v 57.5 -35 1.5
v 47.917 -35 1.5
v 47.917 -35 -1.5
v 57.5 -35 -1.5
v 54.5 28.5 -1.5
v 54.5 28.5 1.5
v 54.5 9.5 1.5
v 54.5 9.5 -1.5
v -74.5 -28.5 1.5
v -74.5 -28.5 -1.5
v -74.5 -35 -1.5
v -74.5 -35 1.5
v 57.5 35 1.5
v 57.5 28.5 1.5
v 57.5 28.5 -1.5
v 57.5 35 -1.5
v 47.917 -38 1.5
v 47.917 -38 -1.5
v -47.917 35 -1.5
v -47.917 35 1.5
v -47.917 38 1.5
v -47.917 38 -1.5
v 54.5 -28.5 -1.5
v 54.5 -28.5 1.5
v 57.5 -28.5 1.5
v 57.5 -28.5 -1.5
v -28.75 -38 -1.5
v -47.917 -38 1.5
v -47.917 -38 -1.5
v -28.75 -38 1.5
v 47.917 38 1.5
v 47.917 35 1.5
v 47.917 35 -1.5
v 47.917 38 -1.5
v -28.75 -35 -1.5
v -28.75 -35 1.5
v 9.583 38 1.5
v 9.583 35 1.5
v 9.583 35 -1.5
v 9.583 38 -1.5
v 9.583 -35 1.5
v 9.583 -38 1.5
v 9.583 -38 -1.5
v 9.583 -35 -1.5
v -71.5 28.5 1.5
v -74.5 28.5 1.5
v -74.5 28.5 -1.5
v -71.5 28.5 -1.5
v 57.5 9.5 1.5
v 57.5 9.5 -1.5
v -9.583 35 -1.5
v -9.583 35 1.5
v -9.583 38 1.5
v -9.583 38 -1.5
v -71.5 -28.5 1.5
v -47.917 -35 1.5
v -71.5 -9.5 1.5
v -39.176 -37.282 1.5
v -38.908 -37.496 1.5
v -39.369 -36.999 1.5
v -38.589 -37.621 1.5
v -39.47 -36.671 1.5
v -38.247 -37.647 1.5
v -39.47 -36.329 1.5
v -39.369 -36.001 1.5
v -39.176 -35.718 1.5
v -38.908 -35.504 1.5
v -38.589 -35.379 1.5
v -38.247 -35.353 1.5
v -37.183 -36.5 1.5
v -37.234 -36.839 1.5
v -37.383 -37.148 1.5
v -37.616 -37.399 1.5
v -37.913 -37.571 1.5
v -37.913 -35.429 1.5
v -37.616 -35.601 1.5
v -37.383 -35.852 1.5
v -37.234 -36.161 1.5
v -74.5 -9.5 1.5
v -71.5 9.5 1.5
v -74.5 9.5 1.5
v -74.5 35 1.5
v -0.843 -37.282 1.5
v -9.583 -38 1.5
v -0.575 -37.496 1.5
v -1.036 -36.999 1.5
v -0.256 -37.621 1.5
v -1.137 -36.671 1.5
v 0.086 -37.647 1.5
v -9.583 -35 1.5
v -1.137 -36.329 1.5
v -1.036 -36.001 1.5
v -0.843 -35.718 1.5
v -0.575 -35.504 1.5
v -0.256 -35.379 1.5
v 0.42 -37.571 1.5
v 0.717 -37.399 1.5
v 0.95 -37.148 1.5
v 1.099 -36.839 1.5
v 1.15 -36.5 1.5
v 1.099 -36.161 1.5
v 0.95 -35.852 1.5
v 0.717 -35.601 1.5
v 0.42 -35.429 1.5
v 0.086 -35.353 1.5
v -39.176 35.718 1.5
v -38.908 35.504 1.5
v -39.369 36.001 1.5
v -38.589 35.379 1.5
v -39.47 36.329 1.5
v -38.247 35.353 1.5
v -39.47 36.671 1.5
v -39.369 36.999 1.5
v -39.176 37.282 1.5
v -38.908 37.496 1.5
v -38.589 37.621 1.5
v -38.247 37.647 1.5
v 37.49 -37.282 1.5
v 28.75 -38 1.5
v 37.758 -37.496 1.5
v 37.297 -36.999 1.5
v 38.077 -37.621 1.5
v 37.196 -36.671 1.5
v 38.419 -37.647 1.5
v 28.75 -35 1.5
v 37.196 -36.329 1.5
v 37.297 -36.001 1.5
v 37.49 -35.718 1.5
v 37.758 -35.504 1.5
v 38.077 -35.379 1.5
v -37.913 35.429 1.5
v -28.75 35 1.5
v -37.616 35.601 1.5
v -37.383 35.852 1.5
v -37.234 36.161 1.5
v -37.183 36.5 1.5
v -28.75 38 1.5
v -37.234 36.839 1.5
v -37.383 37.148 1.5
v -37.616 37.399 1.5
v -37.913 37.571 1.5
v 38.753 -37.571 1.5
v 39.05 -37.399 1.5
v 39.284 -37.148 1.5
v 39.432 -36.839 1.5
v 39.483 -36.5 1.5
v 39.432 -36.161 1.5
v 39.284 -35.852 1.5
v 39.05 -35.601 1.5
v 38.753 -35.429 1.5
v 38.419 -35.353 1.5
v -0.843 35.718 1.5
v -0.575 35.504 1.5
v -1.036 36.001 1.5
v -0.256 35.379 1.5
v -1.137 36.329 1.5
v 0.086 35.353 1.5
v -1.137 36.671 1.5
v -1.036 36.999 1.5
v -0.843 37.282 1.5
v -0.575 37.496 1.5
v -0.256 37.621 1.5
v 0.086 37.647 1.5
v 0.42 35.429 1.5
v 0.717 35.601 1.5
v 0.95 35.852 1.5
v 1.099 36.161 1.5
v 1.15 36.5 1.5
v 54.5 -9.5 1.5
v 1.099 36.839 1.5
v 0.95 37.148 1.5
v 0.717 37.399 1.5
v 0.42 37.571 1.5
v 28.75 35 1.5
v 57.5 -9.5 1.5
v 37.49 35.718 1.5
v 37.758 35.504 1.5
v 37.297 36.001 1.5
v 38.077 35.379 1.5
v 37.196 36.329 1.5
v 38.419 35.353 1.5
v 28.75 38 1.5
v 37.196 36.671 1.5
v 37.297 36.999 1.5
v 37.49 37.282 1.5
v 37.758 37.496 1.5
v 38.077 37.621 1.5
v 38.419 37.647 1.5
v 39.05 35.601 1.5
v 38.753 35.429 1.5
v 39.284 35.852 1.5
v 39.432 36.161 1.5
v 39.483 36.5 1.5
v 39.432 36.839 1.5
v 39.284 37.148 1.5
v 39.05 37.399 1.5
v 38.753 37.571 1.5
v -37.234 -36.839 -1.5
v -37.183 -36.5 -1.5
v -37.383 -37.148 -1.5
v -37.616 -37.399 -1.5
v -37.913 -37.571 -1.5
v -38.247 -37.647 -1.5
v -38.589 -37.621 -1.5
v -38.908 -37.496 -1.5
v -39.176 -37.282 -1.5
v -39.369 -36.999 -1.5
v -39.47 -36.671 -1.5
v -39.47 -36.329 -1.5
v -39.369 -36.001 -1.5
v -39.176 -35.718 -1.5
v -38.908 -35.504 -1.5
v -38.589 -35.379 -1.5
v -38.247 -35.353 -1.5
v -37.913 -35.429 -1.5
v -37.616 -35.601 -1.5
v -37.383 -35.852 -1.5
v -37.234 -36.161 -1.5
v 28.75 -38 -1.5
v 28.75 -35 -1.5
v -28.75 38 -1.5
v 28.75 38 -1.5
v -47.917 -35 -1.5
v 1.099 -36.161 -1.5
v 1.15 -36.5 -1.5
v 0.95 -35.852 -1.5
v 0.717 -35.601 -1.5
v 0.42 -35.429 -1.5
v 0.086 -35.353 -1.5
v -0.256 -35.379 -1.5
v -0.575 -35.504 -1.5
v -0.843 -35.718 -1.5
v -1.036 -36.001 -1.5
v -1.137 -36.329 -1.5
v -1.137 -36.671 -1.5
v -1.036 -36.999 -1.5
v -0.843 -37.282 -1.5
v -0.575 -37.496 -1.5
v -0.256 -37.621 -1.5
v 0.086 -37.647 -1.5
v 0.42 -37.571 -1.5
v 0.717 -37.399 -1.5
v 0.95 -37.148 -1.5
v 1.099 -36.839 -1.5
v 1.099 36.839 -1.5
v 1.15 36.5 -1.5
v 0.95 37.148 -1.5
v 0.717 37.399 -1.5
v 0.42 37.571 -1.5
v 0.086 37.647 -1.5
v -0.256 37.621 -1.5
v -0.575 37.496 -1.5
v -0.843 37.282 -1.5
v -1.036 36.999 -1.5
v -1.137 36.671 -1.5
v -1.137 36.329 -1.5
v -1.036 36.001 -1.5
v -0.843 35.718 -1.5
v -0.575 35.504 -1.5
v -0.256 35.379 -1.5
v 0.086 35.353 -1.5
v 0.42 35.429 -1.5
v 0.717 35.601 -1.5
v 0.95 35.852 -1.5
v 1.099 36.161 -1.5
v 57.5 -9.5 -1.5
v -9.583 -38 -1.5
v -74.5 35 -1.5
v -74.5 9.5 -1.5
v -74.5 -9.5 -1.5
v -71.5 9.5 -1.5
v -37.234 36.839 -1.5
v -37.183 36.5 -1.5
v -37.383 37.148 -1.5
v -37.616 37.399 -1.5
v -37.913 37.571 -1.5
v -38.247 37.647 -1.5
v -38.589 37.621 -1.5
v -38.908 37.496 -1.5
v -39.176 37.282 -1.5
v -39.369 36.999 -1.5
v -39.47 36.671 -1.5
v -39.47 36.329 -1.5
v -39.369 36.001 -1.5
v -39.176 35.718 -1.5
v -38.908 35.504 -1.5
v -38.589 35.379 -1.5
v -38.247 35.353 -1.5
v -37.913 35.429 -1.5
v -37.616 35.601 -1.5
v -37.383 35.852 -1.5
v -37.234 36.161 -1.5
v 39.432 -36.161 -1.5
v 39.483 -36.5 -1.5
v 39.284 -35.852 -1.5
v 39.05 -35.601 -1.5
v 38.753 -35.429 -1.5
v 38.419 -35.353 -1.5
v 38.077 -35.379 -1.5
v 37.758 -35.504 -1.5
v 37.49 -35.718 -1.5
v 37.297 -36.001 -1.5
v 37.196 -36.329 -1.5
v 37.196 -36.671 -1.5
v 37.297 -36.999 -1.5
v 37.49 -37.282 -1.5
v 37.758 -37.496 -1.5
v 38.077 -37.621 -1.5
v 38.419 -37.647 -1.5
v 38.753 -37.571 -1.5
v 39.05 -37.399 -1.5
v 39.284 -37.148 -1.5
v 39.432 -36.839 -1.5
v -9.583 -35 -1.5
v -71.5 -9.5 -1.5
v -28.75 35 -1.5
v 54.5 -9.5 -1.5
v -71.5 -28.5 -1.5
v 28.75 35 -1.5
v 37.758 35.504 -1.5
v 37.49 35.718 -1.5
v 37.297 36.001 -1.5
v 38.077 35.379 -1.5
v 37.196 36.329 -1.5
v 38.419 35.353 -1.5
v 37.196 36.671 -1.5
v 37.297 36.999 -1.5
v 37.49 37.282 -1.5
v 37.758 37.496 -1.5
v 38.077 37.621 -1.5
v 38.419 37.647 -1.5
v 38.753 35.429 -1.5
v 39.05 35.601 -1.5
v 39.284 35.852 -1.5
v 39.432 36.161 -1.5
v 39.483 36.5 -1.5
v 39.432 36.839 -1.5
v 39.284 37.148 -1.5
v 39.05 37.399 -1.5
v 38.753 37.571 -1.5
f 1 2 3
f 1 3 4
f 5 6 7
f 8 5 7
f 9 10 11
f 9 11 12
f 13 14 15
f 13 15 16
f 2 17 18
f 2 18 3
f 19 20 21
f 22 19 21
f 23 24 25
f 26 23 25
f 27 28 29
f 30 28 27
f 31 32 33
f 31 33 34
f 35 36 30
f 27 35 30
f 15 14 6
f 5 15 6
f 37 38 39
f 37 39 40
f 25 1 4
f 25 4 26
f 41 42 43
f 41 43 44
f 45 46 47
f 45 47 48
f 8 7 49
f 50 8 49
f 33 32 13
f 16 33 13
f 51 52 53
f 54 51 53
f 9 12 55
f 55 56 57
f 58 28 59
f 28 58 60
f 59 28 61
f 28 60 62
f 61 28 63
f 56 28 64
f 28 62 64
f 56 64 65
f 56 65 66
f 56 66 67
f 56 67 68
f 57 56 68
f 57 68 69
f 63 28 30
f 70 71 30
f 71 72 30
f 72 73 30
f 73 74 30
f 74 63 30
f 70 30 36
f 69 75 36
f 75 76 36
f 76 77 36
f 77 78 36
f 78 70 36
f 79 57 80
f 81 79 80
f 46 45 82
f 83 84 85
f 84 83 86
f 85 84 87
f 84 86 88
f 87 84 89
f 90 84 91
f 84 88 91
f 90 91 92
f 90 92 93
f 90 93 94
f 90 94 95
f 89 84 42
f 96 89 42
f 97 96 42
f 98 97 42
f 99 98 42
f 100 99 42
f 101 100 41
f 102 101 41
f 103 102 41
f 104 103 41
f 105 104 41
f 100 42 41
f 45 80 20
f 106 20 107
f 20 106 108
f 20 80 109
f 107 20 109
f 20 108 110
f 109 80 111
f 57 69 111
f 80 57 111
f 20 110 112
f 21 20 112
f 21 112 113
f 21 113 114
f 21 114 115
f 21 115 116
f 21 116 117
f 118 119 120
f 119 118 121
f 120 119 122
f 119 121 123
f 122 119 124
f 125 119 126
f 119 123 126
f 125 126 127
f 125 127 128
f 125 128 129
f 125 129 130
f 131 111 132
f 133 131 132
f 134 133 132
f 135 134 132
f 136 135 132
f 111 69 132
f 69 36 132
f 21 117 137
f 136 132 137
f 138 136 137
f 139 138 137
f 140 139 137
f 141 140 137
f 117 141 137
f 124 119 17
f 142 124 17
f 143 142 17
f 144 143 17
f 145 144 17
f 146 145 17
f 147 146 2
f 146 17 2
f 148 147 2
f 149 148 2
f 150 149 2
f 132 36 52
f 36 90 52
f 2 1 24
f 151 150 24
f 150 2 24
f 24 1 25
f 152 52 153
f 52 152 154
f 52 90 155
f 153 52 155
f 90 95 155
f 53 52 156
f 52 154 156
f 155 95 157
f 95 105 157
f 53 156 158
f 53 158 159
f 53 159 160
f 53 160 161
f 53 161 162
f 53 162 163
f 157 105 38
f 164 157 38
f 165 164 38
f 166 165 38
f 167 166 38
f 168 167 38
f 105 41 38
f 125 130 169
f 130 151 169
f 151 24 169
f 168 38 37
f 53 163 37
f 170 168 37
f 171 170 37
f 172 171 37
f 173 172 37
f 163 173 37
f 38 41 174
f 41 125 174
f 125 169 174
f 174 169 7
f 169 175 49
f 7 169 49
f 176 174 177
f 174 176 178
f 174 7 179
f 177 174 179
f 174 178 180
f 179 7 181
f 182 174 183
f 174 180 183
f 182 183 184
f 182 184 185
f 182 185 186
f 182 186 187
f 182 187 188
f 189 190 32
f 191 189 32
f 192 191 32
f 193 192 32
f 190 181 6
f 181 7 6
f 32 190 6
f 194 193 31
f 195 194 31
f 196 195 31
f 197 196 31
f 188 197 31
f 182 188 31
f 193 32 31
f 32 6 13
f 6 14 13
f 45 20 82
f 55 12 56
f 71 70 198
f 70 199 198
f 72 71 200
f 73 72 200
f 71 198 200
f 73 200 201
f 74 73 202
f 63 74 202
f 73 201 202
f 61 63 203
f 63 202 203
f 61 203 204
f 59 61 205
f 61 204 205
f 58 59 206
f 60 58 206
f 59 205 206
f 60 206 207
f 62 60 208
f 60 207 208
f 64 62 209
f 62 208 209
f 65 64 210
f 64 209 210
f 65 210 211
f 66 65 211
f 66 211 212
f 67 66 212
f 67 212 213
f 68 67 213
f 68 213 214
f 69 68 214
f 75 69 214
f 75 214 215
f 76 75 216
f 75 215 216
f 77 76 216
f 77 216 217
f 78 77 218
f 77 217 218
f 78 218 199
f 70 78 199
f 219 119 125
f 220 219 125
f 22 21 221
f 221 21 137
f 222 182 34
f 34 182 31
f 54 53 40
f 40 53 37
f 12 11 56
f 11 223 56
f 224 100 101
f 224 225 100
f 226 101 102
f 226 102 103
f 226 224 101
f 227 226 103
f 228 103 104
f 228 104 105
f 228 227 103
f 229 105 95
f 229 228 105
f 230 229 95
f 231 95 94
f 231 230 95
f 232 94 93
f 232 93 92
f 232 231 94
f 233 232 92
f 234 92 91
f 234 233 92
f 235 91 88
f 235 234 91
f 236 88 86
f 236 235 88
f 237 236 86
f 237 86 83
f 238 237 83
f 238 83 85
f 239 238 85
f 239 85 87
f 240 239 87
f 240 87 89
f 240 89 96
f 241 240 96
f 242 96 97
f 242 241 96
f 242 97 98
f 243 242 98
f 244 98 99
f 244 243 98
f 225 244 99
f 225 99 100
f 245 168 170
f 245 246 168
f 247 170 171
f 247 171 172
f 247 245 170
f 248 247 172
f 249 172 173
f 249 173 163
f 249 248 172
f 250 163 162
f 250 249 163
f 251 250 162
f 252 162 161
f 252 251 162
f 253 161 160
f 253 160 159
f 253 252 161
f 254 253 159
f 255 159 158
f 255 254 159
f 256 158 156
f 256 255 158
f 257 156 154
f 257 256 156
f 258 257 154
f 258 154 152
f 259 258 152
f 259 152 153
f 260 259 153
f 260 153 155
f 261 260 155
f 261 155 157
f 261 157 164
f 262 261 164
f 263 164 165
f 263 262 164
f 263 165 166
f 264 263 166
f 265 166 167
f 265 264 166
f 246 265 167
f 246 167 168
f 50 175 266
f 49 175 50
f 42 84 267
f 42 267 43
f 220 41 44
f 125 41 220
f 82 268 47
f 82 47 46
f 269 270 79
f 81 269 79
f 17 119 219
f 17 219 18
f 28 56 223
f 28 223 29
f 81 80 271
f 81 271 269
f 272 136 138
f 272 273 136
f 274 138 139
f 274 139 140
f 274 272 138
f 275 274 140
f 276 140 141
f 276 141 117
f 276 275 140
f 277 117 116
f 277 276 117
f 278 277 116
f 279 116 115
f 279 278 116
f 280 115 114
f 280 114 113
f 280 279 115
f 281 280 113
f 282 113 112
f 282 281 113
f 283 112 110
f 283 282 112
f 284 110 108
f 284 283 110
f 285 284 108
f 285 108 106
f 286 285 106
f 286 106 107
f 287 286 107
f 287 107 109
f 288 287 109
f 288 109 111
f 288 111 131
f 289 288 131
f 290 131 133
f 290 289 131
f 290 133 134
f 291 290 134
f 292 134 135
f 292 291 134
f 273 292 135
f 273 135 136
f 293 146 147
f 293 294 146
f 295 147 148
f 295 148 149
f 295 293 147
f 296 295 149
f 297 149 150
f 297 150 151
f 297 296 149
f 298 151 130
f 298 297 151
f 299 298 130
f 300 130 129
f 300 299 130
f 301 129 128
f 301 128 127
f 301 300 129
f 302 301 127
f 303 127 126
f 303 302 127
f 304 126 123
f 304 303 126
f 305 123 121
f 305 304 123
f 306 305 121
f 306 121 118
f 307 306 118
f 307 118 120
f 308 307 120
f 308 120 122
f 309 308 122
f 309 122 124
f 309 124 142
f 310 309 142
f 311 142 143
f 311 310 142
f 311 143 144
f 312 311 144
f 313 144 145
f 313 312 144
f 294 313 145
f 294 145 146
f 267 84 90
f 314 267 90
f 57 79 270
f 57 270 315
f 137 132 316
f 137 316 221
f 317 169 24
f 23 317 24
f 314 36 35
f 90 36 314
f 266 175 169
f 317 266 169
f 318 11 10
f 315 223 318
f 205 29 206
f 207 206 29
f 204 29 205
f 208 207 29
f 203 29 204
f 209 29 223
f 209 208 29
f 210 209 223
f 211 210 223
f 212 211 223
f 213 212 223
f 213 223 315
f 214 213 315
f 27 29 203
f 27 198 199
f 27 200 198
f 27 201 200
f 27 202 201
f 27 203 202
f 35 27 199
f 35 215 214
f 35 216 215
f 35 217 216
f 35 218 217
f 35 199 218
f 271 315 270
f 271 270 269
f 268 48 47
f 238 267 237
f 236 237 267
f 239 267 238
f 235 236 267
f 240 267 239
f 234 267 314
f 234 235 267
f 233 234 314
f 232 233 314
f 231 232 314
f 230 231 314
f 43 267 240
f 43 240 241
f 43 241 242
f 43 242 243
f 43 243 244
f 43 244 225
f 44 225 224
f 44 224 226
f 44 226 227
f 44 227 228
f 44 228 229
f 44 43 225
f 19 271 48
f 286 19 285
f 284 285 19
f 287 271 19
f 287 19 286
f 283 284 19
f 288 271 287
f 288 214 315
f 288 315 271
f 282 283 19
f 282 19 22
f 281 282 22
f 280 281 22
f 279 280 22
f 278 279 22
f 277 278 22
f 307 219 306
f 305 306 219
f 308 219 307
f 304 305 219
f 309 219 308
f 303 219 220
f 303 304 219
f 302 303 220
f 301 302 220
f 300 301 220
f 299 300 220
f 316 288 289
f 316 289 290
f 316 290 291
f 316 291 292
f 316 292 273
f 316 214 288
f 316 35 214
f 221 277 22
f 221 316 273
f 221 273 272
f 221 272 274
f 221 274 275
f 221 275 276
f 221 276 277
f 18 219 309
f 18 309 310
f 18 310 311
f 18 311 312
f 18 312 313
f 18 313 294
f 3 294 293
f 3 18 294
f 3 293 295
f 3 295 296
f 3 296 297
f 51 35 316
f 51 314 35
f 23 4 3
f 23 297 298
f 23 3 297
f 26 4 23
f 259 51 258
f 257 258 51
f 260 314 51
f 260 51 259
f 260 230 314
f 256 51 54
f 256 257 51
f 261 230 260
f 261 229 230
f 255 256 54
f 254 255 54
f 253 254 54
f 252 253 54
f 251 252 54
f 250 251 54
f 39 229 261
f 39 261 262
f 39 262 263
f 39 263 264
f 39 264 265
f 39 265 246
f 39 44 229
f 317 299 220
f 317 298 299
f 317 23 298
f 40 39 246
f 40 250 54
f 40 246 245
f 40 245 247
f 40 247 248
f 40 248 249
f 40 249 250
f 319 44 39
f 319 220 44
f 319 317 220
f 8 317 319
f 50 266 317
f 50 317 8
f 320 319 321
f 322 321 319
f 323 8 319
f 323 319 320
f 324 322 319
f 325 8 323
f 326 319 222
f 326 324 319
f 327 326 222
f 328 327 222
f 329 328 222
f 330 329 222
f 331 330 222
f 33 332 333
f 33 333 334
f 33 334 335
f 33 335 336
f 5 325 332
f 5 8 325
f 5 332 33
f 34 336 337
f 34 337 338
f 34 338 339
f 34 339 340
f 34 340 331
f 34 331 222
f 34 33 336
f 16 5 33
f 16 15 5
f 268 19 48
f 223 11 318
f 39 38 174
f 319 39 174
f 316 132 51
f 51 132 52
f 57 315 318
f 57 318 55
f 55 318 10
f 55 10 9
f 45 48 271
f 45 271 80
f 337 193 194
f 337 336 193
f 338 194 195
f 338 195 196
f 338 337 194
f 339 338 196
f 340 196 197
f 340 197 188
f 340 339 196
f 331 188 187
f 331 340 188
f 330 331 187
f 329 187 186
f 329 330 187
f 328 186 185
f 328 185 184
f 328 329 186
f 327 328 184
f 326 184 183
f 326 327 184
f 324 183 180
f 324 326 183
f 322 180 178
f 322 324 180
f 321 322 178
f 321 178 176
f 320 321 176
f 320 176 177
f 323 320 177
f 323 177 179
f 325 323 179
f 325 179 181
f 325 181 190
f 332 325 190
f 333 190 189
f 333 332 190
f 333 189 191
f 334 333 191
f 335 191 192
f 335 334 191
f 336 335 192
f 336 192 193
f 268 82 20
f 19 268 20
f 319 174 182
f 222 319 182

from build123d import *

# Parameters (mm, degrees)
CROQUIS1_W                = 115
CROQUIS1_H                = 70
SALIENTE_EXTRUIR1_DEPTH   = 1.5
CROQUIS2_W                = 19.166666667
CROQUIS2_H                = 3
CROQUIS2_R                = 1.15
SALIENTE_EXTRUIR2_DEPTH   = 1.5
MATRIZL1_COUNT            = 3
MATRIZL1_PITCH            = 38.333333333
SIMETR_A1_COPY_1_SKETCH_W = 19.166666667
SIMETR_A1_COPY_1_SKETCH_H = 3
SIMETR_A1_COPY_1_SKETCH_R = 1.15
SIMETR_A1_COPY_1_DEPTH    = 1.5
SIMETR_A1_COPY_2_SKETCH_W = 19.166666667
SIMETR_A1_COPY_2_SKETCH_H = 3
SIMETR_A1_COPY_2_SKETCH_R = 1.15
SIMETR_A1_COPY_2_DEPTH    = 1.5
CORTAR_EXTRUIR1_DEPTH     = 2.5
MATRIZL2_COUNT            = 2
MATRIZL2_PITCH            = 38
SIMETR_A2_COPY_1_DEPTH    = 2.5
CROQUIS4_W                = 3
CROQUIS4_H                = 6.5
CROQUIS4_H_2              = 19
SALIENTE_EXTRUIR3_DEPTH   = 17
CROQUIS5_W                = 3
CROQUIS5_H                = 19
SALIENTE_EXTRUIR4_DEPTH   = 17


with BuildPart() as part:
    # Croquis1 → Saliente-Extruir1 (new body, symmetric)
    with BuildSketch(Plane.XY):
        Rectangle(CROQUIS1_W, CROQUIS1_H)
    extrude(amount=SALIENTE_EXTRUIR1_DEPTH, both=True)

    # Croquis2 → Saliente-Extruir2 (add, symmetric)
    with BuildSketch(Plane.XY):
        with Locations((-38.333333334, 36.5)):
            Rectangle(CROQUIS2_W, CROQUIS2_H)
        with Locations((-38.333333333, 36.5)):
            Circle(CROQUIS2_R, mode=Mode.SUBTRACT)
    saliente_extruir2 = extrude(amount=SALIENTE_EXTRUIR2_DEPTH, both=True)

    # MatrizL1: Saliente-Extruir2 ×3
    with Locations(*[(i * MATRIZL1_PITCH, 0, 0) for i in range(1, MATRIZL1_COUNT)]):
        add(saliente_extruir2)

    # Simetría1: Saliente-Extruir2 across plane
    add(saliente_extruir2.mirror(Plane.ZX))

    # Simetría1 copy 1 sketch → Simetría1 copy 1 (add, symmetric)
    with BuildSketch(Plane(origin=(38.333333333, 0, 0), x_dir=(1, 0, 0), z_dir=(0, 0, 1))):
        with Locations((-38.333333334, -36.5)):
            Rectangle(SIMETR_A1_COPY_1_SKETCH_W, SIMETR_A1_COPY_1_SKETCH_H)
        with Locations((-38.333333333, -36.5)):
            Circle(SIMETR_A1_COPY_1_SKETCH_R, mode=Mode.SUBTRACT)
    extrude(amount=SIMETR_A1_COPY_1_DEPTH, both=True)

    # Simetría1 copy 2 sketch → Simetría1 copy 2 (add, symmetric)
    with BuildSketch(Plane(origin=(76.666666667, 0, 0), x_dir=(1, 0, 0), z_dir=(0, 0, 1))):
        with Locations((-38.333333334, -36.5)):
            Rectangle(SIMETR_A1_COPY_2_SKETCH_W, SIMETR_A1_COPY_2_SKETCH_H)
        with Locations((-38.333333333, -36.5)):
            Circle(SIMETR_A1_COPY_2_SKETCH_R, mode=Mode.SUBTRACT)
    extrude(amount=SIMETR_A1_COPY_2_DEPTH, both=True)

    # Croquis3 → Cortar-Extruir1 (cut, symmetric)
    with BuildSketch(Plane.XY):
        Polygon((57.5, 28.5), (54.5, 28.5), (54.5, 20.15), (54.5, 17.85), (54.5, 9.5), (57.5, 9.5), align=None)
    cortar_extruir1 = extrude(amount=CORTAR_EXTRUIR1_DEPTH, both=True, mode=Mode.SUBTRACT)

    # MatrizL2: Cortar-Extruir1 ×2
    with Locations(*[(0, -i * MATRIZL2_PITCH, 0) for i in range(1, MATRIZL2_COUNT)]):
        add(cortar_extruir1, mode=Mode.SUBTRACT)

    # Simetría2: Cortar-Extruir1 across plane
    add(cortar_extruir1.mirror(Plane(origin=(0, 0, 0), x_dir=(0, 0, 1), z_dir=(1, 0, 0))), mode=Mode.SUBTRACT)

    # Simetría2 copy 1 sketch → Simetría2 copy 1 (cut, symmetric)
    with BuildSketch(Plane(origin=(0, -38, 0), x_dir=(-1, 0, 0), z_dir=(0, 0, 1))):
        Polygon((57.5, -28.5), (54.5, -28.5), (54.5, -20.15), (54.5, -17.85), (54.5, -9.5), (57.5, -9.5), align=None)
    extrude(amount=SIMETR_A2_COPY_1_DEPTH, both=True, mode=Mode.SUBTRACT)

    # Croquis4 → Saliente-Extruir3 (add)
    with BuildSketch(Plane.ZY.offset(57.5)):
        with Locations((0, -31.75)):
            Rectangle(CROQUIS4_W, CROQUIS4_H)
        with Locations((0, 31.75)):
            Rectangle(CROQUIS4_W, CROQUIS4_H)
        Rectangle(CROQUIS4_W, CROQUIS4_H_2)
    extrude(amount=SALIENTE_EXTRUIR3_DEPTH)

    # Croquis5 → Saliente-Extruir4 (add)
    with BuildSketch(Plane.ZY.offset(54.5)):
        with Locations((0, -19)):
            Rectangle(CROQUIS5_W, CROQUIS5_H)
        with Locations((0, 19)):
            Rectangle(CROQUIS5_W, CROQUIS5_H)
    extrude(amount=SALIENTE_EXTRUIR4_DEPTH)


solid = part.part
